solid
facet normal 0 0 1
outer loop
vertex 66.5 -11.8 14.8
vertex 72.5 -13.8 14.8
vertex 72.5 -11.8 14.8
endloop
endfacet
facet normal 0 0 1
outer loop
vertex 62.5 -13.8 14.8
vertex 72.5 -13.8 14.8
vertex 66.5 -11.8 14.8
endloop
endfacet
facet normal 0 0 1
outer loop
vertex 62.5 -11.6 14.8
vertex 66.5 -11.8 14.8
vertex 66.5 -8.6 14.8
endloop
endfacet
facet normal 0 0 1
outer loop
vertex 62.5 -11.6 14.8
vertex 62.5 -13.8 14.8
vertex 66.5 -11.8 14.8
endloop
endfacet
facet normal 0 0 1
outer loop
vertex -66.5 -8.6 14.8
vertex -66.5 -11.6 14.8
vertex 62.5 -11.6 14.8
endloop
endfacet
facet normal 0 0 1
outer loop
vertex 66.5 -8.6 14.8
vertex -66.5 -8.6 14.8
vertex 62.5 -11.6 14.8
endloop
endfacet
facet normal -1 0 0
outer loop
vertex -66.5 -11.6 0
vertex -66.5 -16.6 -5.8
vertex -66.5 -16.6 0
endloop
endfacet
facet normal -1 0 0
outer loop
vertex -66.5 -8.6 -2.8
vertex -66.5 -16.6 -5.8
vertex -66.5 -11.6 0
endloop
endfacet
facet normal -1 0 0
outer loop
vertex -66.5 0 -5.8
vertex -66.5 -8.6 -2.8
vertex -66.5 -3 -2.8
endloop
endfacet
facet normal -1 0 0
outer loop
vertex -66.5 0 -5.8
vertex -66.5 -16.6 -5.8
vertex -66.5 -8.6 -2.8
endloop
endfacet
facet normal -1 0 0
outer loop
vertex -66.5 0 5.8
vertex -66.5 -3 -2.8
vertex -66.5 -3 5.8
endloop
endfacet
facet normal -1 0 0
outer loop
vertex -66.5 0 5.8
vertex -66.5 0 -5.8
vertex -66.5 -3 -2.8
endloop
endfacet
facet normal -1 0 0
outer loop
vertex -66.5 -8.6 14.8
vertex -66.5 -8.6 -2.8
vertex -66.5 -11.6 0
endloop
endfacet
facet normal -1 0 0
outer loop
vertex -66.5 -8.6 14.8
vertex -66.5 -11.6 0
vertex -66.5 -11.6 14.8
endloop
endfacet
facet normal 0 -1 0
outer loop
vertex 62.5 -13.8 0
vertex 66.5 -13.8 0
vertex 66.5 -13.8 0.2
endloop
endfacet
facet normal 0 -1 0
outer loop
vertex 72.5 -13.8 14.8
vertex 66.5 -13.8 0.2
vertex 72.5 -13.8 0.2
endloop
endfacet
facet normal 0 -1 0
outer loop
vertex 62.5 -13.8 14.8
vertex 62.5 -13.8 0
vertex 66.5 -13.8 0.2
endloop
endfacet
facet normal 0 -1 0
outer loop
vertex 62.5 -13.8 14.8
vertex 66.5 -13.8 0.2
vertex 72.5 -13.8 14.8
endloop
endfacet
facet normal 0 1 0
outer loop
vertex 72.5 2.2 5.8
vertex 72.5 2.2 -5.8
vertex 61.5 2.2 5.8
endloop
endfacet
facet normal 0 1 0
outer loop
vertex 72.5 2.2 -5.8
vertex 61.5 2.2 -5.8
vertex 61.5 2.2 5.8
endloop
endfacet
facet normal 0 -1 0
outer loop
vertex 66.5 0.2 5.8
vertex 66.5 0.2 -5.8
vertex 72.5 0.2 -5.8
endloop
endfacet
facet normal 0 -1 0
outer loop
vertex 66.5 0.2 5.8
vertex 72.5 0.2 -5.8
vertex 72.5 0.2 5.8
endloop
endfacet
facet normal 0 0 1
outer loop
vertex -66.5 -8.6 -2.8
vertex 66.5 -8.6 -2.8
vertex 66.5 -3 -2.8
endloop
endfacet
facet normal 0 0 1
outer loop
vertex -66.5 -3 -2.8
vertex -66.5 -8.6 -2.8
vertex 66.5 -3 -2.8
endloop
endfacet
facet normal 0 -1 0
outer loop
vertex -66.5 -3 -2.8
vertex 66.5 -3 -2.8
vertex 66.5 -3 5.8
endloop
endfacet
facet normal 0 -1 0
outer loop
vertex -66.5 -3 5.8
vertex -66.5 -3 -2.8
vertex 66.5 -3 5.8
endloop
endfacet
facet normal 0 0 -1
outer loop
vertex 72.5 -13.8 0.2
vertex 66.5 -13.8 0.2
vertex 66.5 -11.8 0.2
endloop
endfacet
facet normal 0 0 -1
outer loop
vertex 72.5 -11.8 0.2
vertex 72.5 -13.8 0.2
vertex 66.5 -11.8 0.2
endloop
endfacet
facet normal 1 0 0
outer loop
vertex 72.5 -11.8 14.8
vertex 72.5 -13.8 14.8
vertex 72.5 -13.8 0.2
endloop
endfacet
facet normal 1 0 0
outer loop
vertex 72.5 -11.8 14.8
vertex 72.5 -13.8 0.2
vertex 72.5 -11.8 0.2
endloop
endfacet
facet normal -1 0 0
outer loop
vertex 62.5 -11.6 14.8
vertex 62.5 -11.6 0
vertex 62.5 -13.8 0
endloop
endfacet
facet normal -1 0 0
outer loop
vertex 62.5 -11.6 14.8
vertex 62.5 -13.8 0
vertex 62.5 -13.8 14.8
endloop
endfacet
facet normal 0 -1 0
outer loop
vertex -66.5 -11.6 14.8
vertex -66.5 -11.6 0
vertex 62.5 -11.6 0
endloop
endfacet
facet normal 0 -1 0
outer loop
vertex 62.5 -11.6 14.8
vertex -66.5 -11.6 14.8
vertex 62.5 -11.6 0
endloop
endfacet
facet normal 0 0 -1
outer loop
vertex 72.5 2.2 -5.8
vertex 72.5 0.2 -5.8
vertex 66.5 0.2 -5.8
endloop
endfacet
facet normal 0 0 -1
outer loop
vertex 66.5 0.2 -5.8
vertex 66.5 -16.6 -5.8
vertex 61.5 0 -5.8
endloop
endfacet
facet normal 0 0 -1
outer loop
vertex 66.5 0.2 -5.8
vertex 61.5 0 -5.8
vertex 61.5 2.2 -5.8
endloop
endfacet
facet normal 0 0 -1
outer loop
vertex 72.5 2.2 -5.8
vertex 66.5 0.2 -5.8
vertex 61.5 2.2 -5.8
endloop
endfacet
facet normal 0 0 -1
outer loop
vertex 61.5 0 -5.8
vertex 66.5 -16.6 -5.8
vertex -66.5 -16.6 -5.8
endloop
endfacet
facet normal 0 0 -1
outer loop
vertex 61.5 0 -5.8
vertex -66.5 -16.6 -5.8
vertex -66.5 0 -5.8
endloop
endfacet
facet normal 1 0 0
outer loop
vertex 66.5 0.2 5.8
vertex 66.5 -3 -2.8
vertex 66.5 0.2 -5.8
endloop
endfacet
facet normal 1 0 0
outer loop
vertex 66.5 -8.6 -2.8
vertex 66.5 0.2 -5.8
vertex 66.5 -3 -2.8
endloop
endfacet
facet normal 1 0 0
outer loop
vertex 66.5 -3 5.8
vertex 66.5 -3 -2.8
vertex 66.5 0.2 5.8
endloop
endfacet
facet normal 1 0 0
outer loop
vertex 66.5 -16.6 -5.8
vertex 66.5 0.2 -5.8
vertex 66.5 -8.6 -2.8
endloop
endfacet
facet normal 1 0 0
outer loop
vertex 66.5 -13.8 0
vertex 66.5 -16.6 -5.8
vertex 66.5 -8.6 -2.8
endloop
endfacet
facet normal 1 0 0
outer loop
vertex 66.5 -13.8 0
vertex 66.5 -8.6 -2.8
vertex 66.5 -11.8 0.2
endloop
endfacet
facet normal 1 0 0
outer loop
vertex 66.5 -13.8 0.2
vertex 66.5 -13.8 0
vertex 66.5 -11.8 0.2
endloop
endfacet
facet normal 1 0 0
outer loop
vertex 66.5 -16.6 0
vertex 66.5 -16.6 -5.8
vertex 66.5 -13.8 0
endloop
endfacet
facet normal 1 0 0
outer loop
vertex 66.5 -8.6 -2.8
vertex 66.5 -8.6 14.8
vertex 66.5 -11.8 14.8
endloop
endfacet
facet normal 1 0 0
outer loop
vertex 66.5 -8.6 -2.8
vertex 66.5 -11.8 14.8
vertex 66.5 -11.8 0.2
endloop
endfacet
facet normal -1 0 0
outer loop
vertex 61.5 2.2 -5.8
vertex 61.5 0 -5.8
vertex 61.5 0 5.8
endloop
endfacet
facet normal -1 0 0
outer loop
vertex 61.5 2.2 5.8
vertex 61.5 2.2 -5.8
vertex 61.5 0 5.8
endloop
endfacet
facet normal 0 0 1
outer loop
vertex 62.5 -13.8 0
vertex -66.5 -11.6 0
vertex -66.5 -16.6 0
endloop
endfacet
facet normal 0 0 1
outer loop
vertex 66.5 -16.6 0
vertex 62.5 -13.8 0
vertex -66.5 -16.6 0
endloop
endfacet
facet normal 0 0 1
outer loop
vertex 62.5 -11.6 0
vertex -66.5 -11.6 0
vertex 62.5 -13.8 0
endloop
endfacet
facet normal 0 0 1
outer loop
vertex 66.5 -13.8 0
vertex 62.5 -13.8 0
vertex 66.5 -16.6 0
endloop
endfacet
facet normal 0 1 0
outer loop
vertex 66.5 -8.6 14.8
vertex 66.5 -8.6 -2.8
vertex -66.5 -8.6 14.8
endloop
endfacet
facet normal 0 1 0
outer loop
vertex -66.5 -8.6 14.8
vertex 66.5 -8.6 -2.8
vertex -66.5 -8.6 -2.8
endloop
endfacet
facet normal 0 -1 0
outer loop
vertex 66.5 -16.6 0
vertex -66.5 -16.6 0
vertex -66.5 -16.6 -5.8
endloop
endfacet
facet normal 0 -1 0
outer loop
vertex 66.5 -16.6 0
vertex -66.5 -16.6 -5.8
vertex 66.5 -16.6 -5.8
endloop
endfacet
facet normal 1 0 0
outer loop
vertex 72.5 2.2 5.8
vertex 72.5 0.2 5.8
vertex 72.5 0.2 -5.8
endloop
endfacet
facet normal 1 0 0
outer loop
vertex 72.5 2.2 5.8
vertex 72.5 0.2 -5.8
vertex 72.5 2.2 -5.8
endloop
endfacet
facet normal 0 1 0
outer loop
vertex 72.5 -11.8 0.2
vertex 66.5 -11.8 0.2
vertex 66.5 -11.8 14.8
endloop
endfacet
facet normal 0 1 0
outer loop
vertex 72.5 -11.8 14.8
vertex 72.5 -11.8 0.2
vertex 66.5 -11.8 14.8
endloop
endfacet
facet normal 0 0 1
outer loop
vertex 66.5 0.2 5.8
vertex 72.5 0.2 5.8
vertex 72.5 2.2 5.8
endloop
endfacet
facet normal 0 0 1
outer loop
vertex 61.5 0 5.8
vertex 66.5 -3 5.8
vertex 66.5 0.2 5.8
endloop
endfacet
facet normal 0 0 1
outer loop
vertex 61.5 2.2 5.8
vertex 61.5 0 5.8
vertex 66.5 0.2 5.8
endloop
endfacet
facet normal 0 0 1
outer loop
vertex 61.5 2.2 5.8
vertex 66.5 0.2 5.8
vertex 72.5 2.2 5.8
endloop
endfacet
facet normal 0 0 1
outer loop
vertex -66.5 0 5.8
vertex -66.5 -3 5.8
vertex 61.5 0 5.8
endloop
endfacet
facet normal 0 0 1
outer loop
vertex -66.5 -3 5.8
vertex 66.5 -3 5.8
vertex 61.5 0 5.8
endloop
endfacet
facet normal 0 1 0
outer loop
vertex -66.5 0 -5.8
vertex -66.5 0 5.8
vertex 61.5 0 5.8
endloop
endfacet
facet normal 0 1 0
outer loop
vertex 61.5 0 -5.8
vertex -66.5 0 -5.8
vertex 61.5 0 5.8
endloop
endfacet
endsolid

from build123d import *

# Parameters (mm, degrees)
F0_W      = 133
F0_H      = 11.6
F1_DEPTH  = 11.6
F2_W      = 5.6
F2_H      = 8.6
F3_DEPTH  = 133
F4_DEPTH  = 9
F5_W      = 133
F5_H      = 5.8
F6_DEPTH  = 5
F8_W      = 4
F8_H      = 14.8
F9_DEPTH  = 2.2
F10_W     = 2
F10_H     = 14.6
F11_DEPTH = 6
F12_W     = 5
F12_H     = 11.6
F13_DEPTH = 2.2
F14_W     = 2
F14_H     = 11.6
F15_DEPTH = 6


with BuildPart() as f1:
    # F0 (on Front) → F1 (new body)
    with BuildSketch(Plane.XZ):
        Rectangle(F0_W, F0_H)
    extrude(amount=F1_DEPTH)

    # F2 (on face) → F3 (cut)
    with BuildSketch(Plane.YZ.offset(66.5)):
        with Locations((-5.8, 1.5)):
            Rectangle(F2_W, F2_H)
    extrude(amount=-F3_DEPTH, mode=Mode.SUBTRACT)

    # F4 (add): a face of the model
    f4_faces = [f1.faces().sort_by_distance(p)[0] for p in [
        (0, -10.1, 5.8),
    ]]
    extrude(f4_faces, amount=F4_DEPTH)

    # F5 (on face) → F6 (join)
    with BuildSketch(Plane.XZ.offset(11.6)):
        with Locations((0, -2.9)):
            Rectangle(F5_W, F5_H)
    extrude(amount=F6_DEPTH)

    # F8 (on face) → F9 (join)
    with BuildSketch(Plane.XZ.offset(11.6)):
        with Locations((64.5, 7.4)):
            Rectangle(F8_W, F8_H)
    extrude(amount=F9_DEPTH)

    # F10 (on face) → F11 (join)
    with BuildSketch(Plane.YZ.offset(66.5)):
        with Locations((-12.8, 7.5)):
            Rectangle(F10_W, F10_H)
    extrude(amount=F11_DEPTH)

    # F12 (on face) → F13 (join)
    with BuildSketch(Plane(origin=(0, 0, 0), x_dir=(-1, 0, 0), z_dir=(0, 1, 0))):
        with Locations((-64, 0)):
            Rectangle(F12_W, F12_H)
    extrude(amount=F13_DEPTH)

    # F14 (on face) → F15 (join)
    with BuildSketch(Plane.YZ.offset(66.5)):
        with Locations((1.2, 0)):
            Rectangle(F14_W, F14_H)
    extrude(amount=F15_DEPTH)


solid = f1.part
